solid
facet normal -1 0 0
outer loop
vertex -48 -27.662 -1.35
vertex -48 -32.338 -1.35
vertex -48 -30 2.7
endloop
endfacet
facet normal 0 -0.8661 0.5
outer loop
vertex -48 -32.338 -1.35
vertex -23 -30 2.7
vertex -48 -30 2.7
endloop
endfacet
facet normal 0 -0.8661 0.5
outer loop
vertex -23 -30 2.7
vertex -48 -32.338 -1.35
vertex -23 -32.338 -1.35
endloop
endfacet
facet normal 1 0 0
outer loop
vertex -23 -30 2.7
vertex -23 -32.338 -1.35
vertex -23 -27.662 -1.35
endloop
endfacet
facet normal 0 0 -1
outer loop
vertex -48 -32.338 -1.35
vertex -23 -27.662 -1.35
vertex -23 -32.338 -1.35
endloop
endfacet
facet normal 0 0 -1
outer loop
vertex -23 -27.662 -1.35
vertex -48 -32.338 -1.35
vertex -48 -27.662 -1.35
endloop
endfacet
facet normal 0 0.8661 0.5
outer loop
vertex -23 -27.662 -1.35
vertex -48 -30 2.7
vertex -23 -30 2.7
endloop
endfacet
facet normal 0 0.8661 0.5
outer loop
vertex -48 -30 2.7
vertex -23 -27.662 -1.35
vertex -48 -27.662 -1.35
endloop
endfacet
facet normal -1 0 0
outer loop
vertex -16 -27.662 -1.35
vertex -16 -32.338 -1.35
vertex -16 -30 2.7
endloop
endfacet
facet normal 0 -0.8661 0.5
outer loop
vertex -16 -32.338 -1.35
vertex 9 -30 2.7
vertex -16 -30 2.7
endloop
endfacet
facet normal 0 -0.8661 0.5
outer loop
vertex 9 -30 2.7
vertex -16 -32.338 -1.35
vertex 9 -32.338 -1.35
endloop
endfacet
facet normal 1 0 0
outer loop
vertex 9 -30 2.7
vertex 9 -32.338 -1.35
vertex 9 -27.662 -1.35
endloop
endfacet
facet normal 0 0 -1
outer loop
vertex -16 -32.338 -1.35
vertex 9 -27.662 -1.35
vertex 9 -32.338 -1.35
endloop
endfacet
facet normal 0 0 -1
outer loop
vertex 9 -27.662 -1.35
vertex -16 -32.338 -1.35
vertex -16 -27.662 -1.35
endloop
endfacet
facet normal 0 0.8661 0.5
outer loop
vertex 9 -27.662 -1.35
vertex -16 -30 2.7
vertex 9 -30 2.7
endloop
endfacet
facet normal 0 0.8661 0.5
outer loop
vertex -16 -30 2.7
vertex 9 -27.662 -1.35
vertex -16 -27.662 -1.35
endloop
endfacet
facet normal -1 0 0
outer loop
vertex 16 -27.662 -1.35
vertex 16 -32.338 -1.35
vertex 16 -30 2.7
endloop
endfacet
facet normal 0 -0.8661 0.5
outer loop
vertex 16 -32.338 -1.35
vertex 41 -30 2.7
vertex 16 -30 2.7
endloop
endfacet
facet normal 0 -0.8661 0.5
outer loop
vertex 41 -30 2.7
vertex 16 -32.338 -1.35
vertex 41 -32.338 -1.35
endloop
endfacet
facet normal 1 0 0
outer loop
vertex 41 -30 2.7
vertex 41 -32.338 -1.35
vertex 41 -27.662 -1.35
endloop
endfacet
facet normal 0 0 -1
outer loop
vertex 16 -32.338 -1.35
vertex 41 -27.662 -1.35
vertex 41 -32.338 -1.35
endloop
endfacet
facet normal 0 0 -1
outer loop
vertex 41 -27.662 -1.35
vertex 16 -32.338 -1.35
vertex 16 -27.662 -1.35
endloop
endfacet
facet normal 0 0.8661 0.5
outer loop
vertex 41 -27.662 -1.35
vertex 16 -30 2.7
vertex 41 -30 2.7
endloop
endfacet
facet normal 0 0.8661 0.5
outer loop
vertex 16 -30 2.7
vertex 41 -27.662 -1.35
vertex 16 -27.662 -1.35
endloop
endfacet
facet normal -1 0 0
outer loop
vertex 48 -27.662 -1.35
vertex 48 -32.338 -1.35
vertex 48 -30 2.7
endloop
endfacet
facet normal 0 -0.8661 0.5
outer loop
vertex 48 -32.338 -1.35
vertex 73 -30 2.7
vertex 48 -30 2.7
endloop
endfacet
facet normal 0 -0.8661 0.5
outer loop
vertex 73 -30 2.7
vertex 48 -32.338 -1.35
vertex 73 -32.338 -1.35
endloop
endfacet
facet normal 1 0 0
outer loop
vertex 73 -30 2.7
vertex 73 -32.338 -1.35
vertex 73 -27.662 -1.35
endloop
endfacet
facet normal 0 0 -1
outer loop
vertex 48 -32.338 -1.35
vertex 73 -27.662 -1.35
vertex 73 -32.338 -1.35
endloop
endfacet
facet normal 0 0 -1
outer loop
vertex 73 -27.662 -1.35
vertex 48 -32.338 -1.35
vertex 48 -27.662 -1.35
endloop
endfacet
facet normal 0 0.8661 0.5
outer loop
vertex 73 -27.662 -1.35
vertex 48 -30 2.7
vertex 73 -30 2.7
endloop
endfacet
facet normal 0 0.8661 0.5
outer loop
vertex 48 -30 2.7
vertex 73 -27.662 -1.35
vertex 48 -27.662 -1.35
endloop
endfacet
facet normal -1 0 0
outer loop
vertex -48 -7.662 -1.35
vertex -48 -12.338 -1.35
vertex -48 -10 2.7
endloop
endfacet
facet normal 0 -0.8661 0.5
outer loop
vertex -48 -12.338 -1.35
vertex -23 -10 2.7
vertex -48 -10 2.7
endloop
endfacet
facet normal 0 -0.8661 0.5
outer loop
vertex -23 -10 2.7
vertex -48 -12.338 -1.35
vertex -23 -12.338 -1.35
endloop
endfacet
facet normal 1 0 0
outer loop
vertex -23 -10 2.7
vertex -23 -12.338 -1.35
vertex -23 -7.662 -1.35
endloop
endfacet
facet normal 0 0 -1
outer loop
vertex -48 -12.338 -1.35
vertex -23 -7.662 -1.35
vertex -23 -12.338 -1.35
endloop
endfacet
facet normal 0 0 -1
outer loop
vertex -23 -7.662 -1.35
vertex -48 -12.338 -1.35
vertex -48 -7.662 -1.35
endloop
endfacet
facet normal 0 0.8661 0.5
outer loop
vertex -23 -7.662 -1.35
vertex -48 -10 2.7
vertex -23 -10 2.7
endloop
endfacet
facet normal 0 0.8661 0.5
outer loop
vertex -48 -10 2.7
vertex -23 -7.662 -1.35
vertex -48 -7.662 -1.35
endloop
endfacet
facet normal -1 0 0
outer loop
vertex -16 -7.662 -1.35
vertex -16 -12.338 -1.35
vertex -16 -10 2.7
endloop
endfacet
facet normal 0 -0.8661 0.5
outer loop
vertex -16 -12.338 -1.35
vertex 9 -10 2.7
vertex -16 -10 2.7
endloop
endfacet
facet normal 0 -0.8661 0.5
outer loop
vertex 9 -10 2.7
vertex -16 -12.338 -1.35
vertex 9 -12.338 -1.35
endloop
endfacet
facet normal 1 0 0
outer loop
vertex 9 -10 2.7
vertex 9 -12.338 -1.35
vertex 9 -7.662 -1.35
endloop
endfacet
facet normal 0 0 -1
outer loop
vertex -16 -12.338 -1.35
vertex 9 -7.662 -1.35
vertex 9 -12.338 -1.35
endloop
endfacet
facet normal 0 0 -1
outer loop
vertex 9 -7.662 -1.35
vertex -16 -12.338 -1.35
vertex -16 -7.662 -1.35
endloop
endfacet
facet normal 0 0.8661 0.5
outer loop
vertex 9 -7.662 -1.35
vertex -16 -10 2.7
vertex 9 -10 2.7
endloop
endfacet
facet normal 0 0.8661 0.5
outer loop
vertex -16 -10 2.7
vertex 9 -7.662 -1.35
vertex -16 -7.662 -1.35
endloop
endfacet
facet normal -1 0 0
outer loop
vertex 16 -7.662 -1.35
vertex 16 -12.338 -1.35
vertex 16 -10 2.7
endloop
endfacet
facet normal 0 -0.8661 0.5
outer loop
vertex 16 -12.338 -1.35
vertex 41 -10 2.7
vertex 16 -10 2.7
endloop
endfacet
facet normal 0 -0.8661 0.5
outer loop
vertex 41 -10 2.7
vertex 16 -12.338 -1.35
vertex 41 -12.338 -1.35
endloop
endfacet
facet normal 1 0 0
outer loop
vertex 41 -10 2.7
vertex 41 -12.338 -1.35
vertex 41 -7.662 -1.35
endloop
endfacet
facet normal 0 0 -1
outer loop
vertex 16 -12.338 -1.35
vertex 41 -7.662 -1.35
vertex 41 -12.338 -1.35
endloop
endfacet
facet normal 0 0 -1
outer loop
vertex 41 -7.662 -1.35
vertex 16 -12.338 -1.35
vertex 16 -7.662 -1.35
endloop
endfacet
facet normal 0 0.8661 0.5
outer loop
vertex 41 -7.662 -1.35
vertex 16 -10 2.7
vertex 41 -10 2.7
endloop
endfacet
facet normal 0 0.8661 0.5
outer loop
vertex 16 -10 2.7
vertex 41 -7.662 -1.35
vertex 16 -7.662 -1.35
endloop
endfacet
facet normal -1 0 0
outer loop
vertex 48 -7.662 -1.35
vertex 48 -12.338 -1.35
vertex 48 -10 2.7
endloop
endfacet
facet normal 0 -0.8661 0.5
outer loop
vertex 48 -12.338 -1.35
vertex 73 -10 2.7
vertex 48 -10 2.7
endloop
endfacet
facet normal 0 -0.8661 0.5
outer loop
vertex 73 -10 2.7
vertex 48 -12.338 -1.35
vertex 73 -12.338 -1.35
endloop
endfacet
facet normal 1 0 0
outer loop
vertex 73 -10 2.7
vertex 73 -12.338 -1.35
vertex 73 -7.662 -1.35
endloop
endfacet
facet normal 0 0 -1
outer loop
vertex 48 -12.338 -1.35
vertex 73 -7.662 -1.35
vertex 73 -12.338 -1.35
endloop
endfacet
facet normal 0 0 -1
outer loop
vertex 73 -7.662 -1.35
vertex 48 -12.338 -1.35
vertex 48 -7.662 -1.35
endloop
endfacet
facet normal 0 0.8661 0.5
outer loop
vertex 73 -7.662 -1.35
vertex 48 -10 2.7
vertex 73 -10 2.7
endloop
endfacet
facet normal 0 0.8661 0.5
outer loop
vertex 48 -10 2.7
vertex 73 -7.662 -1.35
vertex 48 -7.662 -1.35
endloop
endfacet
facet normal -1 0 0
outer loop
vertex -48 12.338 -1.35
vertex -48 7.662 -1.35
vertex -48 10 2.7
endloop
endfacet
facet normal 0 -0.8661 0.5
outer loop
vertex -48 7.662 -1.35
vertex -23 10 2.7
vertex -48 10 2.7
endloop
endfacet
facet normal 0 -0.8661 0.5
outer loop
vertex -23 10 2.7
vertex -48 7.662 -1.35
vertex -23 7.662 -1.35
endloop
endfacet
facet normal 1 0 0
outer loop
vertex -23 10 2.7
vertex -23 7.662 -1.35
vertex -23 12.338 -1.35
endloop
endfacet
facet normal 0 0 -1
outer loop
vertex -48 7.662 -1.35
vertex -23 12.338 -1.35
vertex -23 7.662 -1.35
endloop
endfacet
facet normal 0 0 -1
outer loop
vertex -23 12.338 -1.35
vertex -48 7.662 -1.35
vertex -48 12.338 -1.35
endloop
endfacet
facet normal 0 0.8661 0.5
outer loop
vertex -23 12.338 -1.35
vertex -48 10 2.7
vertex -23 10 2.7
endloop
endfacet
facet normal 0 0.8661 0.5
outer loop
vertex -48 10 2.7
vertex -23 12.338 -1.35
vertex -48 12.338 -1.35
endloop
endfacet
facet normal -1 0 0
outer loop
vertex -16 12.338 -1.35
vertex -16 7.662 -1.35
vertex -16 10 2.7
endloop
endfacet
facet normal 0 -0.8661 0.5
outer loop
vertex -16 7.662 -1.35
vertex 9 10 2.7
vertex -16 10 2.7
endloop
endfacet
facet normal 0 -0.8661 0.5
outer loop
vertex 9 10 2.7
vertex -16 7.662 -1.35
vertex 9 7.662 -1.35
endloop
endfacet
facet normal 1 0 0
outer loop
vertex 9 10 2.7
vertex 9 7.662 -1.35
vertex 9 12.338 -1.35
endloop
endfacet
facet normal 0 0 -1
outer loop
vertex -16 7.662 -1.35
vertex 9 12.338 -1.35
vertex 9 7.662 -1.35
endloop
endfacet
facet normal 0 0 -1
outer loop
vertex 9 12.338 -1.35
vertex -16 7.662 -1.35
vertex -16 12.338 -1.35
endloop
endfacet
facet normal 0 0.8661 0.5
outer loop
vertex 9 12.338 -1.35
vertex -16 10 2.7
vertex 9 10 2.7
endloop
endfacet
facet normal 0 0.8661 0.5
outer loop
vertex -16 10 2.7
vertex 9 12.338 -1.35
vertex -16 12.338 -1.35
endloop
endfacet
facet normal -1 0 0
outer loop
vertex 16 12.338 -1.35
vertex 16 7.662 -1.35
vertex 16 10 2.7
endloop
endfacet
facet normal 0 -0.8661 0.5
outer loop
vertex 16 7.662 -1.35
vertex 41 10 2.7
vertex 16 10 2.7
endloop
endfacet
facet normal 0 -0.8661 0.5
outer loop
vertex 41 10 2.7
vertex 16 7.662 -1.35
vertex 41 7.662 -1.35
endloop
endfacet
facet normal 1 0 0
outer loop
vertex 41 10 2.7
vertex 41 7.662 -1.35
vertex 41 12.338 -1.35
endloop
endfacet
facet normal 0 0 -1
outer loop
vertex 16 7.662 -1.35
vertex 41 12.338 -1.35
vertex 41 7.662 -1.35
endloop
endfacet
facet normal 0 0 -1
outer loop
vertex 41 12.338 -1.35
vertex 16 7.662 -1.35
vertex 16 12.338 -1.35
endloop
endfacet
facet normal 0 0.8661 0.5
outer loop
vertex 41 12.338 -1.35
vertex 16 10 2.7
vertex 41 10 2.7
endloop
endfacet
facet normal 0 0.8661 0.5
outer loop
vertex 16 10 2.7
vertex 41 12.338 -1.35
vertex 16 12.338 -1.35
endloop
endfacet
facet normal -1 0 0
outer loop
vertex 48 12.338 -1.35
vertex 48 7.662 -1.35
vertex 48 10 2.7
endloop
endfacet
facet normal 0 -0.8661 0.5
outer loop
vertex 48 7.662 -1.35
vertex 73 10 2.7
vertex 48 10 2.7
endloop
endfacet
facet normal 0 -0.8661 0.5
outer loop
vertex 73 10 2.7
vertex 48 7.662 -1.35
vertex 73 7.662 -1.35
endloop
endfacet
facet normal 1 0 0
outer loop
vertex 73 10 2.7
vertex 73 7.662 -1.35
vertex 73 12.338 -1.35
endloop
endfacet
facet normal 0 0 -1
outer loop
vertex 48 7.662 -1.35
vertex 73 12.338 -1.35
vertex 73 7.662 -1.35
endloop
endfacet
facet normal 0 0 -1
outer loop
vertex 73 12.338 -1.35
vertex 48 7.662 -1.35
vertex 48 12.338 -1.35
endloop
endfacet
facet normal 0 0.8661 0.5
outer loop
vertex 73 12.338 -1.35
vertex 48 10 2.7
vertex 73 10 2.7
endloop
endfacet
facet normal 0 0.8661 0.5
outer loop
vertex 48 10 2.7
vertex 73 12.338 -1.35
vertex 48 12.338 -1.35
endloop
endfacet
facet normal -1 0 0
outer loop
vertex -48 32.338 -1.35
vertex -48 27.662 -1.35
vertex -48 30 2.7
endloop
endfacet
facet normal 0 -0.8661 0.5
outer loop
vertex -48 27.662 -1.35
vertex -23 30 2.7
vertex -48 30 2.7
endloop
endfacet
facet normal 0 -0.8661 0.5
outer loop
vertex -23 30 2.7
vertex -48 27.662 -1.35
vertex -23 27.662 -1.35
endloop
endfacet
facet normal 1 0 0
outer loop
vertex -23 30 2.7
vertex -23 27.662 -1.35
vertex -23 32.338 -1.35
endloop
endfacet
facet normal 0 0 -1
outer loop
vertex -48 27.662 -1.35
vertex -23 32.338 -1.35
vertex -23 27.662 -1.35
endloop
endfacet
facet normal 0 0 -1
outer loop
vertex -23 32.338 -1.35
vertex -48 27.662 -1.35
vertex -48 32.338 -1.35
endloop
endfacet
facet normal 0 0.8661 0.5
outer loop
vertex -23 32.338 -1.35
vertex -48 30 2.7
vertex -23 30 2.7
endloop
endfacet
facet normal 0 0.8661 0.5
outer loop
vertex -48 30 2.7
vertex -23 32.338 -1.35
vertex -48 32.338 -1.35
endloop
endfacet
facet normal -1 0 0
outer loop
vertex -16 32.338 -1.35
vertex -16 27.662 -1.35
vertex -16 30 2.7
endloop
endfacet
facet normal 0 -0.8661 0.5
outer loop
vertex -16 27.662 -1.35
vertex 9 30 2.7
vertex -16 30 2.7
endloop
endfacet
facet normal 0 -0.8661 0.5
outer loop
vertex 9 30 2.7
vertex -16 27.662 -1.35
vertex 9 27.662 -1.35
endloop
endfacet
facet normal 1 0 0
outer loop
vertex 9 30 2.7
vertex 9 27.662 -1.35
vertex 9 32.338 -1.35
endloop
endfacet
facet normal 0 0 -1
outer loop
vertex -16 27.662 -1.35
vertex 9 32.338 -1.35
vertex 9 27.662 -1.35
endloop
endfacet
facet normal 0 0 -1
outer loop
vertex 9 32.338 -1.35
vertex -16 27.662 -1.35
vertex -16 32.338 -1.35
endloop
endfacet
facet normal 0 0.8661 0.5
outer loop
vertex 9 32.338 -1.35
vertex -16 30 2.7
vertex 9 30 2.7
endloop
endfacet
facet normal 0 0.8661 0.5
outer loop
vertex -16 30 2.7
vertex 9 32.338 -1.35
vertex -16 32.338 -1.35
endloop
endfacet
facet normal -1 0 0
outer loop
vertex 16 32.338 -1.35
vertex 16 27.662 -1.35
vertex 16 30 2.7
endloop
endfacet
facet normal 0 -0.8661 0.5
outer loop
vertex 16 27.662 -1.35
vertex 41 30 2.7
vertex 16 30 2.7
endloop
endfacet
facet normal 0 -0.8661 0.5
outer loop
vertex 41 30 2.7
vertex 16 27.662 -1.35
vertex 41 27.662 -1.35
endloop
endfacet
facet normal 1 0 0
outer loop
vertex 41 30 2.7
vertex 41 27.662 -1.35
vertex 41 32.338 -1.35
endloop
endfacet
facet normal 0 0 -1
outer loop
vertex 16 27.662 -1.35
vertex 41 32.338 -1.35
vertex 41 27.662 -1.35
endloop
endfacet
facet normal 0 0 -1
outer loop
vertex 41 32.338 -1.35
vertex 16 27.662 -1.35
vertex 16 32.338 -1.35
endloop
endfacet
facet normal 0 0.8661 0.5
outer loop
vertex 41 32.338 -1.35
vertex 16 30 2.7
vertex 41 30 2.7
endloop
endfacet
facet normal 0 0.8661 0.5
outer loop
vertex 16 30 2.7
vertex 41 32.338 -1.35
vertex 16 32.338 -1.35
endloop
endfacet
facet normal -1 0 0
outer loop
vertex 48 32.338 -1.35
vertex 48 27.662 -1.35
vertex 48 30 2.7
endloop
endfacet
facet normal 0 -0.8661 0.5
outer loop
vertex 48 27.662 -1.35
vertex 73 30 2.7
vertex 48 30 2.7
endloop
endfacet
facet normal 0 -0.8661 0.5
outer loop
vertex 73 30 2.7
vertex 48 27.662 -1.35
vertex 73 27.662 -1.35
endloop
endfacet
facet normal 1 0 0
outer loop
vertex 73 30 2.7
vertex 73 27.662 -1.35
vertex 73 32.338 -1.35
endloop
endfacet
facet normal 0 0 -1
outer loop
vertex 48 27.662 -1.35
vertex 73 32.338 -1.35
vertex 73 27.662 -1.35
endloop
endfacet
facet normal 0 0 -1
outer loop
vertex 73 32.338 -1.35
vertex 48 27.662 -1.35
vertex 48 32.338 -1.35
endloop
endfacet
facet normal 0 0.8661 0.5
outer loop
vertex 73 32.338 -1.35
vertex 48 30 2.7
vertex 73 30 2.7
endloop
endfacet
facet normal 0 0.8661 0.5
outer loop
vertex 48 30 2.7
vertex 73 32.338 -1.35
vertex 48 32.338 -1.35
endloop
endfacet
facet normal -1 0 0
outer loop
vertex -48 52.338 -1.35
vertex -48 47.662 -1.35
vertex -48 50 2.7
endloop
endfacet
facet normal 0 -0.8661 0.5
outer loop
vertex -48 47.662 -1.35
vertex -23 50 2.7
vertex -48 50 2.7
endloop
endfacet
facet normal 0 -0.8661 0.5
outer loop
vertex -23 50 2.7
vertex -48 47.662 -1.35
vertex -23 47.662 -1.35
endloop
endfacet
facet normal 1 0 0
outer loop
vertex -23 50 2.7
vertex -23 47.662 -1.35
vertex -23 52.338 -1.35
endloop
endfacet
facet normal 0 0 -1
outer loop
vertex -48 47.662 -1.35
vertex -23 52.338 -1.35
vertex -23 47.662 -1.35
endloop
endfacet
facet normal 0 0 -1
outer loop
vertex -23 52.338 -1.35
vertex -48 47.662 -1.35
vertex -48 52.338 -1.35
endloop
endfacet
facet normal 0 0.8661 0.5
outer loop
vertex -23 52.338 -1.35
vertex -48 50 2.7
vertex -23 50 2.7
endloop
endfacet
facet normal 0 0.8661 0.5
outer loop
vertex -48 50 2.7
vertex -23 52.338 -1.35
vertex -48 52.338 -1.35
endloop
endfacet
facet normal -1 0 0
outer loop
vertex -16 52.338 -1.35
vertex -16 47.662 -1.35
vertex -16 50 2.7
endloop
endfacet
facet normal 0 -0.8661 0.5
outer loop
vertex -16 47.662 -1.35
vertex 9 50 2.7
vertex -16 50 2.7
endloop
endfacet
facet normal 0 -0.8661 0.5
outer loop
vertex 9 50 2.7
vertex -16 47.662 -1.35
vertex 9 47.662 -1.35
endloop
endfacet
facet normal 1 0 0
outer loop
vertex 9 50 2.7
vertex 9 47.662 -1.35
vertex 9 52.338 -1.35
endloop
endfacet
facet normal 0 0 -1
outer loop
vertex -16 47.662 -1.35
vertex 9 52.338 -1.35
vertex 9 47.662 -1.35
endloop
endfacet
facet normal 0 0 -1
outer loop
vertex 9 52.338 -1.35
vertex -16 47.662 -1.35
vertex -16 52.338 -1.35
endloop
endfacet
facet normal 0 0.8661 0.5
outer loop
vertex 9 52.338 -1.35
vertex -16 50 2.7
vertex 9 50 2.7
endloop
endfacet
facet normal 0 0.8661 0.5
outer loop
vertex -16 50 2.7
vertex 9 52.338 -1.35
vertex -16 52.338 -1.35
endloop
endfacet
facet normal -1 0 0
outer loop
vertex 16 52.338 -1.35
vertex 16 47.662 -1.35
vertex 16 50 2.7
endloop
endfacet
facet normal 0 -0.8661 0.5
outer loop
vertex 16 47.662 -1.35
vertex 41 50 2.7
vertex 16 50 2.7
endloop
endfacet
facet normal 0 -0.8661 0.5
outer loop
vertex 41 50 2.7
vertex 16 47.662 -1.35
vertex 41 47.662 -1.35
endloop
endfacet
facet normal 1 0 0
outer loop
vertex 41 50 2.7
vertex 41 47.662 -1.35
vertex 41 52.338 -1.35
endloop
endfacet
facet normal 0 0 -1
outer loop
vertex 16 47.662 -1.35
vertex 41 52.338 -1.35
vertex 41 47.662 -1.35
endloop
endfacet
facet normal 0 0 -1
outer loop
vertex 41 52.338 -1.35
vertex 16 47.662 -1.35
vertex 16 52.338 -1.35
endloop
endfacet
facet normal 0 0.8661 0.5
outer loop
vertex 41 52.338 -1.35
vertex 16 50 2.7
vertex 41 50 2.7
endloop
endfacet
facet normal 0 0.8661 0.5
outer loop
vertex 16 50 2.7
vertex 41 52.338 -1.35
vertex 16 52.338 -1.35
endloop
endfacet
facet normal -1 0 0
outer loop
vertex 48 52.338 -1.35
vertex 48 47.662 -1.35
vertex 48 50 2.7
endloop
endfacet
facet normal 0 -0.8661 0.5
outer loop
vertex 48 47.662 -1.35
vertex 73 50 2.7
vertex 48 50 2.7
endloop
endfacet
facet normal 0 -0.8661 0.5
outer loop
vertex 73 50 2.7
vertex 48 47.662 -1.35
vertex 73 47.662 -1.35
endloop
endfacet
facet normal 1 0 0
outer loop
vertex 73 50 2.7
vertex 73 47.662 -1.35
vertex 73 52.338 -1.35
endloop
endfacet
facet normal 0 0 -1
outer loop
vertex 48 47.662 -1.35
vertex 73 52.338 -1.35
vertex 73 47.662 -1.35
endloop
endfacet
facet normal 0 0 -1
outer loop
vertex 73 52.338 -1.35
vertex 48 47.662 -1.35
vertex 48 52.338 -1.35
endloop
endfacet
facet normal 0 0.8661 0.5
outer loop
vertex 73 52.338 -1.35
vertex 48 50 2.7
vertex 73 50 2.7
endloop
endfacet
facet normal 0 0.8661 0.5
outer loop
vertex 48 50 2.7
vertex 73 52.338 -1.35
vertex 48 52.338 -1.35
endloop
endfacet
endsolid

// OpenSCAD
module step(len, mod)
{
	for (i = [0:$children-1])
		translate([ len*(i - ($children-1)/2), 0, 0 ]) children((i+mod) % $children);
}

for (i = [1:5])
{
	translate([0, -50+i*20, 0]) step(32, i)
	{
      triangulo_base();
      triangulo_base();
      triangulo_base();
      triangulo_base();
	}
}


module triangulo_base(){
  rotate([0, 90, 0]) {
    rotate(-30){
      triangle_tube(25, 5.4/2, 5.4/2);
    }
  }
}



//triangle_tube(20, 5, 5);
module triangle_tube(height,radius,wall)
{
   tubify(radius,wall) triangle_prism(height,radius);
}

//Tubifies any regular prism
module tubify(radius,wall)
{
  difference()
  {
    child(0);
    translate([0, 0, -0.1]) scale([(radius-wall)/radius, (radius-wall)/radius, 2]) child(0);
  }
}

module triangle_prism(height,radius)
{
  linear_extrude(height=height) triangle(radius);
}

module triangle(radius)
{
  o=radius/2;		//equivalent to radius*sin(30)
  a=radius*sqrt(3)/2;	//equivalent to radius*cos(30)
  polygon(points=[[-a,-o],[0,radius],[a,-o]],paths=[[0,1,2]]);
}
